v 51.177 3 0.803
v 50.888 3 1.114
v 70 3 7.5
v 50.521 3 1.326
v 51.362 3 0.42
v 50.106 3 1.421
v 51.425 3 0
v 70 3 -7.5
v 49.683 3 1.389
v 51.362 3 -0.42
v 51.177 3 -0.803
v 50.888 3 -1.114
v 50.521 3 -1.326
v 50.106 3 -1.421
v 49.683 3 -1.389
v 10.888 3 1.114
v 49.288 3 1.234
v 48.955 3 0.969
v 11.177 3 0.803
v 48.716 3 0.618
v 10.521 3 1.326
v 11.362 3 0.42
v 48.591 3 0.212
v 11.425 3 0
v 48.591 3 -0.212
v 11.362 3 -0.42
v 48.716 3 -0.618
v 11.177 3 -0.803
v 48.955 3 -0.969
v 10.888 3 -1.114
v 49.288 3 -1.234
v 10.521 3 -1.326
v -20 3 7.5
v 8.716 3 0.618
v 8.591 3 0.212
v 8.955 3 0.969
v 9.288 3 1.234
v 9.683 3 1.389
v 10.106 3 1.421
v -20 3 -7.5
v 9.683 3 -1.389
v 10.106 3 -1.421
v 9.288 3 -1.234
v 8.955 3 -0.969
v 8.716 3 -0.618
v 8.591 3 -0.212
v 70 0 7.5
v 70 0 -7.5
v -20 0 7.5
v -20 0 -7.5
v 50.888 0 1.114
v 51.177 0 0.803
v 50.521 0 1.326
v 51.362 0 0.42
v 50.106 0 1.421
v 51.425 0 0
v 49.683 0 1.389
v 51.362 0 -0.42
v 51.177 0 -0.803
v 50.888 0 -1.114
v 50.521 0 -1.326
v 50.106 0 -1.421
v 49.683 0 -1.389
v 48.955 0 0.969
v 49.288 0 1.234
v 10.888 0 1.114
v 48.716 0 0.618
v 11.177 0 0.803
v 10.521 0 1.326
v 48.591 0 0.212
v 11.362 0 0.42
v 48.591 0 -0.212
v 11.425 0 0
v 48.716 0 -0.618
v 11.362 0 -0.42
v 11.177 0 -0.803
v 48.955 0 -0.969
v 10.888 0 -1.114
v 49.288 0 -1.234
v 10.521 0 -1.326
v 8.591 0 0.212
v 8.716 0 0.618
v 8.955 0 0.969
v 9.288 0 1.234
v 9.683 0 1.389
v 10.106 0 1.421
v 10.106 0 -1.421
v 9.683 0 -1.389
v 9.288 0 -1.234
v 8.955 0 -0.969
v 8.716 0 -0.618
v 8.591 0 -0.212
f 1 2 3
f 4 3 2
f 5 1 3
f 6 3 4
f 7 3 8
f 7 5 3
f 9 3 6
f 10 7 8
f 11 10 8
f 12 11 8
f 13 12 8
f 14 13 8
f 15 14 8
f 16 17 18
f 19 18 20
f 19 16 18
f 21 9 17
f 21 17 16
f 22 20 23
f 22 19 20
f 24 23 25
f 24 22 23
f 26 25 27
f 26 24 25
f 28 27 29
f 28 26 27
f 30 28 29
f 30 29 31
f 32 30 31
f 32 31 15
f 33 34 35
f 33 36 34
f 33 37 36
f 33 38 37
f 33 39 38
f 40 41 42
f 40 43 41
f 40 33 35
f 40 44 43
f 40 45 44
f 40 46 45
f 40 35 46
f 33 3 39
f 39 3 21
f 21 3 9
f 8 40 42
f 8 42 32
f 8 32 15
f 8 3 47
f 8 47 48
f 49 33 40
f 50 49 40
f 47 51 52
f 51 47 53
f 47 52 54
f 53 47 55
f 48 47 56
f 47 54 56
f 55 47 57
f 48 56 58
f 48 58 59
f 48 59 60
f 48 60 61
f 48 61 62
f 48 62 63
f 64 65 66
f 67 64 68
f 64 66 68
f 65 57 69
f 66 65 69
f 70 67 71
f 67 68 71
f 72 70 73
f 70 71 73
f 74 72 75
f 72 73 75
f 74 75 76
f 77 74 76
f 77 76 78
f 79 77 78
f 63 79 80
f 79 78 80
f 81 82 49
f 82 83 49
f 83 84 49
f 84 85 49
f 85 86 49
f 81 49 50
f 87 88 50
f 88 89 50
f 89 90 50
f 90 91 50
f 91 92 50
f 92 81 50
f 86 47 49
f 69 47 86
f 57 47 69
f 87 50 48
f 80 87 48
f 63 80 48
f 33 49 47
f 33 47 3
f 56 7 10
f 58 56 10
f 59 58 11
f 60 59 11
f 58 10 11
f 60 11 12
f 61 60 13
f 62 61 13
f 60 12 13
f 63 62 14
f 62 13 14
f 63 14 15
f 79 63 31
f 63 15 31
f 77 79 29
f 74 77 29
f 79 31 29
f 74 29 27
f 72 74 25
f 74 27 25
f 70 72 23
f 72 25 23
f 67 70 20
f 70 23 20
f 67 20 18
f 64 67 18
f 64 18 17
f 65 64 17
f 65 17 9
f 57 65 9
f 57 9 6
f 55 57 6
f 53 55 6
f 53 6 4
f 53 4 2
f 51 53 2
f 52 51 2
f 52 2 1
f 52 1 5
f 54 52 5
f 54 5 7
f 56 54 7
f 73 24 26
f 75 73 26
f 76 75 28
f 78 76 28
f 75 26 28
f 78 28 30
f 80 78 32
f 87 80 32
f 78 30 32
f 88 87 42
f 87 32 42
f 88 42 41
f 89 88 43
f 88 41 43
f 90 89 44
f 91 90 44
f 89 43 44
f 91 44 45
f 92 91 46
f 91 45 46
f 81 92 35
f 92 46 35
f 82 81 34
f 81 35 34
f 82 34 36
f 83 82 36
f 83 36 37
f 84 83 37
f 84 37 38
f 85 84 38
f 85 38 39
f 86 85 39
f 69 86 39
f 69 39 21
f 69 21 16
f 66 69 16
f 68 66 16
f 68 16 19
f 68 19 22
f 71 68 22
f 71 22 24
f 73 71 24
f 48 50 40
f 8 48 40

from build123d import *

# Parameters (mm, degrees)
SKETCH1_W           = 100
SKETCH1_H           = 15
BOSS_EXTRUDE1_DEPTH = 3
SKETCH2_R           = 1
CUT_EXTRUDE1_DEPTH  = 10
SKETCH3_R           = 2.5
CUT_EXTRUDE2_DEPTH  = 10
CUT_EXTRUDE3_DEPTH  = 10
FILLET1_R           = 5
FILLET2_R           = 1
SKETCH7_W           = 15
SKETCH7_H           = 3
BOSS_EXTRUDE2_DEPTH = 20
SKETCH8_W           = 41.116503549
SKETCH8_H           = 15
CUT_EXTRUDE6_DEPTH  = 20
SKETCH9_R           = 1.425
CUT_EXTRUDE7_DEPTH  = 20


with BuildPart() as part:
    # Sketch1 → Boss-Extrude1 (new body)
    with BuildSketch(Plane(origin=(0, 0, 0), x_dir=(1, 0, 0), z_dir=(0, 1, 0))):
        Rectangle(SKETCH1_W, SKETCH1_H)
    extrude(amount=BOSS_EXTRUDE1_DEPTH)

    # Sketch2 → Cut-Extrude1 (cut)
    with BuildSketch(Plane(origin=(0, 3, 0), x_dir=(1, 0, 0), z_dir=(0, 1, 0))):
        with Locations((-28.87, 0)):
            Circle(SKETCH2_R)
        with Locations((-42, 0)):
            Circle(SKETCH2_R)
    extrude(amount=-CUT_EXTRUDE1_DEPTH, mode=Mode.SUBTRACT)

    # Sketch3 → Cut-Extrude2 (cut)
    with BuildSketch(Plane.XZ):
        with Locations((-35.434103263, -0.006545742)):
            Circle(SKETCH3_R)
    extrude(amount=-CUT_EXTRUDE2_DEPTH, mode=Mode.SUBTRACT)

    # Sketch4 → Cut-Extrude3 (cut)
    with BuildSketch(Plane(origin=(0, 0, 0), x_dir=(-1, 0, 0), z_dir=(0, -1, 0))):
        with BuildLine():
            Line((50, 1.885031535), (50, 7.5))
            Line((50, 7.5), (39.062958866, 7.5))
            Line((39.062958866, 7.5), (41.762759664, 3.577599022))
            ThreePointArc((41.762759664, 3.577599022), (42.595166406, 2.79306797), (43.676751147, 2.42082557))
            Line((43.676751147, 2.42082557), (50, 1.885031535))
        make_face()
    cut_extrude3 = extrude(amount=-CUT_EXTRUDE3_DEPTH, mode=Mode.SUBTRACT)

    # Mirror1: Cut-Extrude3 across plane
    add(cut_extrude3.mirror(Plane.XY), mode=Mode.SUBTRACT)

    # Fillet1
    fillet1_edges = [part.edges().sort_by_distance(p)[0] for p in [
        (-39.062958866, 1.5, -7.5),
        (-39.062958866, 1.5, 7.5),
    ]]
    fillet(fillet1_edges, radius=FILLET1_R)

    # Fillet2
    fillet2_edges = [part.edges().sort_by_distance(p)[0] for p in [
        (-50, 1.5, -1.885031535),
        (-50, 1.5, 1.885031535),
    ]]
    fillet(fillet2_edges, radius=FILLET2_R)

    # Sketch7 → Boss-Extrude2 (add)
    with BuildSketch(Plane(origin=(50, 0, 0), x_dir=(0, 0, -1), z_dir=(1, 0, 0))):
        with Locations((0, 1.5)):
            Rectangle(SKETCH7_W, SKETCH7_H)
    extrude(amount=BOSS_EXTRUDE2_DEPTH)

    # Sketch8 → Cut-Extrude6 (cut)
    with BuildSketch(Plane(origin=(0, 3, 0), x_dir=(1, 0, 0), z_dir=(0, 1, 0))):
        with Locations((-40.558251775, 0)):
            Rectangle(SKETCH8_W, SKETCH8_H)
    extrude(amount=-CUT_EXTRUDE6_DEPTH, mode=Mode.SUBTRACT)

    # Sketch9 → Cut-Extrude7 (cut)
    with BuildSketch(Plane(origin=(0, 3, 0), x_dir=(1, 0, 0), z_dir=(0, 1, 0))):
        with Locations((50, 0)):
            Circle(SKETCH9_R)
        with Locations((10, 0)):
            Circle(SKETCH9_R)
    extrude(amount=-CUT_EXTRUDE7_DEPTH, mode=Mode.SUBTRACT)


solid = part.part
